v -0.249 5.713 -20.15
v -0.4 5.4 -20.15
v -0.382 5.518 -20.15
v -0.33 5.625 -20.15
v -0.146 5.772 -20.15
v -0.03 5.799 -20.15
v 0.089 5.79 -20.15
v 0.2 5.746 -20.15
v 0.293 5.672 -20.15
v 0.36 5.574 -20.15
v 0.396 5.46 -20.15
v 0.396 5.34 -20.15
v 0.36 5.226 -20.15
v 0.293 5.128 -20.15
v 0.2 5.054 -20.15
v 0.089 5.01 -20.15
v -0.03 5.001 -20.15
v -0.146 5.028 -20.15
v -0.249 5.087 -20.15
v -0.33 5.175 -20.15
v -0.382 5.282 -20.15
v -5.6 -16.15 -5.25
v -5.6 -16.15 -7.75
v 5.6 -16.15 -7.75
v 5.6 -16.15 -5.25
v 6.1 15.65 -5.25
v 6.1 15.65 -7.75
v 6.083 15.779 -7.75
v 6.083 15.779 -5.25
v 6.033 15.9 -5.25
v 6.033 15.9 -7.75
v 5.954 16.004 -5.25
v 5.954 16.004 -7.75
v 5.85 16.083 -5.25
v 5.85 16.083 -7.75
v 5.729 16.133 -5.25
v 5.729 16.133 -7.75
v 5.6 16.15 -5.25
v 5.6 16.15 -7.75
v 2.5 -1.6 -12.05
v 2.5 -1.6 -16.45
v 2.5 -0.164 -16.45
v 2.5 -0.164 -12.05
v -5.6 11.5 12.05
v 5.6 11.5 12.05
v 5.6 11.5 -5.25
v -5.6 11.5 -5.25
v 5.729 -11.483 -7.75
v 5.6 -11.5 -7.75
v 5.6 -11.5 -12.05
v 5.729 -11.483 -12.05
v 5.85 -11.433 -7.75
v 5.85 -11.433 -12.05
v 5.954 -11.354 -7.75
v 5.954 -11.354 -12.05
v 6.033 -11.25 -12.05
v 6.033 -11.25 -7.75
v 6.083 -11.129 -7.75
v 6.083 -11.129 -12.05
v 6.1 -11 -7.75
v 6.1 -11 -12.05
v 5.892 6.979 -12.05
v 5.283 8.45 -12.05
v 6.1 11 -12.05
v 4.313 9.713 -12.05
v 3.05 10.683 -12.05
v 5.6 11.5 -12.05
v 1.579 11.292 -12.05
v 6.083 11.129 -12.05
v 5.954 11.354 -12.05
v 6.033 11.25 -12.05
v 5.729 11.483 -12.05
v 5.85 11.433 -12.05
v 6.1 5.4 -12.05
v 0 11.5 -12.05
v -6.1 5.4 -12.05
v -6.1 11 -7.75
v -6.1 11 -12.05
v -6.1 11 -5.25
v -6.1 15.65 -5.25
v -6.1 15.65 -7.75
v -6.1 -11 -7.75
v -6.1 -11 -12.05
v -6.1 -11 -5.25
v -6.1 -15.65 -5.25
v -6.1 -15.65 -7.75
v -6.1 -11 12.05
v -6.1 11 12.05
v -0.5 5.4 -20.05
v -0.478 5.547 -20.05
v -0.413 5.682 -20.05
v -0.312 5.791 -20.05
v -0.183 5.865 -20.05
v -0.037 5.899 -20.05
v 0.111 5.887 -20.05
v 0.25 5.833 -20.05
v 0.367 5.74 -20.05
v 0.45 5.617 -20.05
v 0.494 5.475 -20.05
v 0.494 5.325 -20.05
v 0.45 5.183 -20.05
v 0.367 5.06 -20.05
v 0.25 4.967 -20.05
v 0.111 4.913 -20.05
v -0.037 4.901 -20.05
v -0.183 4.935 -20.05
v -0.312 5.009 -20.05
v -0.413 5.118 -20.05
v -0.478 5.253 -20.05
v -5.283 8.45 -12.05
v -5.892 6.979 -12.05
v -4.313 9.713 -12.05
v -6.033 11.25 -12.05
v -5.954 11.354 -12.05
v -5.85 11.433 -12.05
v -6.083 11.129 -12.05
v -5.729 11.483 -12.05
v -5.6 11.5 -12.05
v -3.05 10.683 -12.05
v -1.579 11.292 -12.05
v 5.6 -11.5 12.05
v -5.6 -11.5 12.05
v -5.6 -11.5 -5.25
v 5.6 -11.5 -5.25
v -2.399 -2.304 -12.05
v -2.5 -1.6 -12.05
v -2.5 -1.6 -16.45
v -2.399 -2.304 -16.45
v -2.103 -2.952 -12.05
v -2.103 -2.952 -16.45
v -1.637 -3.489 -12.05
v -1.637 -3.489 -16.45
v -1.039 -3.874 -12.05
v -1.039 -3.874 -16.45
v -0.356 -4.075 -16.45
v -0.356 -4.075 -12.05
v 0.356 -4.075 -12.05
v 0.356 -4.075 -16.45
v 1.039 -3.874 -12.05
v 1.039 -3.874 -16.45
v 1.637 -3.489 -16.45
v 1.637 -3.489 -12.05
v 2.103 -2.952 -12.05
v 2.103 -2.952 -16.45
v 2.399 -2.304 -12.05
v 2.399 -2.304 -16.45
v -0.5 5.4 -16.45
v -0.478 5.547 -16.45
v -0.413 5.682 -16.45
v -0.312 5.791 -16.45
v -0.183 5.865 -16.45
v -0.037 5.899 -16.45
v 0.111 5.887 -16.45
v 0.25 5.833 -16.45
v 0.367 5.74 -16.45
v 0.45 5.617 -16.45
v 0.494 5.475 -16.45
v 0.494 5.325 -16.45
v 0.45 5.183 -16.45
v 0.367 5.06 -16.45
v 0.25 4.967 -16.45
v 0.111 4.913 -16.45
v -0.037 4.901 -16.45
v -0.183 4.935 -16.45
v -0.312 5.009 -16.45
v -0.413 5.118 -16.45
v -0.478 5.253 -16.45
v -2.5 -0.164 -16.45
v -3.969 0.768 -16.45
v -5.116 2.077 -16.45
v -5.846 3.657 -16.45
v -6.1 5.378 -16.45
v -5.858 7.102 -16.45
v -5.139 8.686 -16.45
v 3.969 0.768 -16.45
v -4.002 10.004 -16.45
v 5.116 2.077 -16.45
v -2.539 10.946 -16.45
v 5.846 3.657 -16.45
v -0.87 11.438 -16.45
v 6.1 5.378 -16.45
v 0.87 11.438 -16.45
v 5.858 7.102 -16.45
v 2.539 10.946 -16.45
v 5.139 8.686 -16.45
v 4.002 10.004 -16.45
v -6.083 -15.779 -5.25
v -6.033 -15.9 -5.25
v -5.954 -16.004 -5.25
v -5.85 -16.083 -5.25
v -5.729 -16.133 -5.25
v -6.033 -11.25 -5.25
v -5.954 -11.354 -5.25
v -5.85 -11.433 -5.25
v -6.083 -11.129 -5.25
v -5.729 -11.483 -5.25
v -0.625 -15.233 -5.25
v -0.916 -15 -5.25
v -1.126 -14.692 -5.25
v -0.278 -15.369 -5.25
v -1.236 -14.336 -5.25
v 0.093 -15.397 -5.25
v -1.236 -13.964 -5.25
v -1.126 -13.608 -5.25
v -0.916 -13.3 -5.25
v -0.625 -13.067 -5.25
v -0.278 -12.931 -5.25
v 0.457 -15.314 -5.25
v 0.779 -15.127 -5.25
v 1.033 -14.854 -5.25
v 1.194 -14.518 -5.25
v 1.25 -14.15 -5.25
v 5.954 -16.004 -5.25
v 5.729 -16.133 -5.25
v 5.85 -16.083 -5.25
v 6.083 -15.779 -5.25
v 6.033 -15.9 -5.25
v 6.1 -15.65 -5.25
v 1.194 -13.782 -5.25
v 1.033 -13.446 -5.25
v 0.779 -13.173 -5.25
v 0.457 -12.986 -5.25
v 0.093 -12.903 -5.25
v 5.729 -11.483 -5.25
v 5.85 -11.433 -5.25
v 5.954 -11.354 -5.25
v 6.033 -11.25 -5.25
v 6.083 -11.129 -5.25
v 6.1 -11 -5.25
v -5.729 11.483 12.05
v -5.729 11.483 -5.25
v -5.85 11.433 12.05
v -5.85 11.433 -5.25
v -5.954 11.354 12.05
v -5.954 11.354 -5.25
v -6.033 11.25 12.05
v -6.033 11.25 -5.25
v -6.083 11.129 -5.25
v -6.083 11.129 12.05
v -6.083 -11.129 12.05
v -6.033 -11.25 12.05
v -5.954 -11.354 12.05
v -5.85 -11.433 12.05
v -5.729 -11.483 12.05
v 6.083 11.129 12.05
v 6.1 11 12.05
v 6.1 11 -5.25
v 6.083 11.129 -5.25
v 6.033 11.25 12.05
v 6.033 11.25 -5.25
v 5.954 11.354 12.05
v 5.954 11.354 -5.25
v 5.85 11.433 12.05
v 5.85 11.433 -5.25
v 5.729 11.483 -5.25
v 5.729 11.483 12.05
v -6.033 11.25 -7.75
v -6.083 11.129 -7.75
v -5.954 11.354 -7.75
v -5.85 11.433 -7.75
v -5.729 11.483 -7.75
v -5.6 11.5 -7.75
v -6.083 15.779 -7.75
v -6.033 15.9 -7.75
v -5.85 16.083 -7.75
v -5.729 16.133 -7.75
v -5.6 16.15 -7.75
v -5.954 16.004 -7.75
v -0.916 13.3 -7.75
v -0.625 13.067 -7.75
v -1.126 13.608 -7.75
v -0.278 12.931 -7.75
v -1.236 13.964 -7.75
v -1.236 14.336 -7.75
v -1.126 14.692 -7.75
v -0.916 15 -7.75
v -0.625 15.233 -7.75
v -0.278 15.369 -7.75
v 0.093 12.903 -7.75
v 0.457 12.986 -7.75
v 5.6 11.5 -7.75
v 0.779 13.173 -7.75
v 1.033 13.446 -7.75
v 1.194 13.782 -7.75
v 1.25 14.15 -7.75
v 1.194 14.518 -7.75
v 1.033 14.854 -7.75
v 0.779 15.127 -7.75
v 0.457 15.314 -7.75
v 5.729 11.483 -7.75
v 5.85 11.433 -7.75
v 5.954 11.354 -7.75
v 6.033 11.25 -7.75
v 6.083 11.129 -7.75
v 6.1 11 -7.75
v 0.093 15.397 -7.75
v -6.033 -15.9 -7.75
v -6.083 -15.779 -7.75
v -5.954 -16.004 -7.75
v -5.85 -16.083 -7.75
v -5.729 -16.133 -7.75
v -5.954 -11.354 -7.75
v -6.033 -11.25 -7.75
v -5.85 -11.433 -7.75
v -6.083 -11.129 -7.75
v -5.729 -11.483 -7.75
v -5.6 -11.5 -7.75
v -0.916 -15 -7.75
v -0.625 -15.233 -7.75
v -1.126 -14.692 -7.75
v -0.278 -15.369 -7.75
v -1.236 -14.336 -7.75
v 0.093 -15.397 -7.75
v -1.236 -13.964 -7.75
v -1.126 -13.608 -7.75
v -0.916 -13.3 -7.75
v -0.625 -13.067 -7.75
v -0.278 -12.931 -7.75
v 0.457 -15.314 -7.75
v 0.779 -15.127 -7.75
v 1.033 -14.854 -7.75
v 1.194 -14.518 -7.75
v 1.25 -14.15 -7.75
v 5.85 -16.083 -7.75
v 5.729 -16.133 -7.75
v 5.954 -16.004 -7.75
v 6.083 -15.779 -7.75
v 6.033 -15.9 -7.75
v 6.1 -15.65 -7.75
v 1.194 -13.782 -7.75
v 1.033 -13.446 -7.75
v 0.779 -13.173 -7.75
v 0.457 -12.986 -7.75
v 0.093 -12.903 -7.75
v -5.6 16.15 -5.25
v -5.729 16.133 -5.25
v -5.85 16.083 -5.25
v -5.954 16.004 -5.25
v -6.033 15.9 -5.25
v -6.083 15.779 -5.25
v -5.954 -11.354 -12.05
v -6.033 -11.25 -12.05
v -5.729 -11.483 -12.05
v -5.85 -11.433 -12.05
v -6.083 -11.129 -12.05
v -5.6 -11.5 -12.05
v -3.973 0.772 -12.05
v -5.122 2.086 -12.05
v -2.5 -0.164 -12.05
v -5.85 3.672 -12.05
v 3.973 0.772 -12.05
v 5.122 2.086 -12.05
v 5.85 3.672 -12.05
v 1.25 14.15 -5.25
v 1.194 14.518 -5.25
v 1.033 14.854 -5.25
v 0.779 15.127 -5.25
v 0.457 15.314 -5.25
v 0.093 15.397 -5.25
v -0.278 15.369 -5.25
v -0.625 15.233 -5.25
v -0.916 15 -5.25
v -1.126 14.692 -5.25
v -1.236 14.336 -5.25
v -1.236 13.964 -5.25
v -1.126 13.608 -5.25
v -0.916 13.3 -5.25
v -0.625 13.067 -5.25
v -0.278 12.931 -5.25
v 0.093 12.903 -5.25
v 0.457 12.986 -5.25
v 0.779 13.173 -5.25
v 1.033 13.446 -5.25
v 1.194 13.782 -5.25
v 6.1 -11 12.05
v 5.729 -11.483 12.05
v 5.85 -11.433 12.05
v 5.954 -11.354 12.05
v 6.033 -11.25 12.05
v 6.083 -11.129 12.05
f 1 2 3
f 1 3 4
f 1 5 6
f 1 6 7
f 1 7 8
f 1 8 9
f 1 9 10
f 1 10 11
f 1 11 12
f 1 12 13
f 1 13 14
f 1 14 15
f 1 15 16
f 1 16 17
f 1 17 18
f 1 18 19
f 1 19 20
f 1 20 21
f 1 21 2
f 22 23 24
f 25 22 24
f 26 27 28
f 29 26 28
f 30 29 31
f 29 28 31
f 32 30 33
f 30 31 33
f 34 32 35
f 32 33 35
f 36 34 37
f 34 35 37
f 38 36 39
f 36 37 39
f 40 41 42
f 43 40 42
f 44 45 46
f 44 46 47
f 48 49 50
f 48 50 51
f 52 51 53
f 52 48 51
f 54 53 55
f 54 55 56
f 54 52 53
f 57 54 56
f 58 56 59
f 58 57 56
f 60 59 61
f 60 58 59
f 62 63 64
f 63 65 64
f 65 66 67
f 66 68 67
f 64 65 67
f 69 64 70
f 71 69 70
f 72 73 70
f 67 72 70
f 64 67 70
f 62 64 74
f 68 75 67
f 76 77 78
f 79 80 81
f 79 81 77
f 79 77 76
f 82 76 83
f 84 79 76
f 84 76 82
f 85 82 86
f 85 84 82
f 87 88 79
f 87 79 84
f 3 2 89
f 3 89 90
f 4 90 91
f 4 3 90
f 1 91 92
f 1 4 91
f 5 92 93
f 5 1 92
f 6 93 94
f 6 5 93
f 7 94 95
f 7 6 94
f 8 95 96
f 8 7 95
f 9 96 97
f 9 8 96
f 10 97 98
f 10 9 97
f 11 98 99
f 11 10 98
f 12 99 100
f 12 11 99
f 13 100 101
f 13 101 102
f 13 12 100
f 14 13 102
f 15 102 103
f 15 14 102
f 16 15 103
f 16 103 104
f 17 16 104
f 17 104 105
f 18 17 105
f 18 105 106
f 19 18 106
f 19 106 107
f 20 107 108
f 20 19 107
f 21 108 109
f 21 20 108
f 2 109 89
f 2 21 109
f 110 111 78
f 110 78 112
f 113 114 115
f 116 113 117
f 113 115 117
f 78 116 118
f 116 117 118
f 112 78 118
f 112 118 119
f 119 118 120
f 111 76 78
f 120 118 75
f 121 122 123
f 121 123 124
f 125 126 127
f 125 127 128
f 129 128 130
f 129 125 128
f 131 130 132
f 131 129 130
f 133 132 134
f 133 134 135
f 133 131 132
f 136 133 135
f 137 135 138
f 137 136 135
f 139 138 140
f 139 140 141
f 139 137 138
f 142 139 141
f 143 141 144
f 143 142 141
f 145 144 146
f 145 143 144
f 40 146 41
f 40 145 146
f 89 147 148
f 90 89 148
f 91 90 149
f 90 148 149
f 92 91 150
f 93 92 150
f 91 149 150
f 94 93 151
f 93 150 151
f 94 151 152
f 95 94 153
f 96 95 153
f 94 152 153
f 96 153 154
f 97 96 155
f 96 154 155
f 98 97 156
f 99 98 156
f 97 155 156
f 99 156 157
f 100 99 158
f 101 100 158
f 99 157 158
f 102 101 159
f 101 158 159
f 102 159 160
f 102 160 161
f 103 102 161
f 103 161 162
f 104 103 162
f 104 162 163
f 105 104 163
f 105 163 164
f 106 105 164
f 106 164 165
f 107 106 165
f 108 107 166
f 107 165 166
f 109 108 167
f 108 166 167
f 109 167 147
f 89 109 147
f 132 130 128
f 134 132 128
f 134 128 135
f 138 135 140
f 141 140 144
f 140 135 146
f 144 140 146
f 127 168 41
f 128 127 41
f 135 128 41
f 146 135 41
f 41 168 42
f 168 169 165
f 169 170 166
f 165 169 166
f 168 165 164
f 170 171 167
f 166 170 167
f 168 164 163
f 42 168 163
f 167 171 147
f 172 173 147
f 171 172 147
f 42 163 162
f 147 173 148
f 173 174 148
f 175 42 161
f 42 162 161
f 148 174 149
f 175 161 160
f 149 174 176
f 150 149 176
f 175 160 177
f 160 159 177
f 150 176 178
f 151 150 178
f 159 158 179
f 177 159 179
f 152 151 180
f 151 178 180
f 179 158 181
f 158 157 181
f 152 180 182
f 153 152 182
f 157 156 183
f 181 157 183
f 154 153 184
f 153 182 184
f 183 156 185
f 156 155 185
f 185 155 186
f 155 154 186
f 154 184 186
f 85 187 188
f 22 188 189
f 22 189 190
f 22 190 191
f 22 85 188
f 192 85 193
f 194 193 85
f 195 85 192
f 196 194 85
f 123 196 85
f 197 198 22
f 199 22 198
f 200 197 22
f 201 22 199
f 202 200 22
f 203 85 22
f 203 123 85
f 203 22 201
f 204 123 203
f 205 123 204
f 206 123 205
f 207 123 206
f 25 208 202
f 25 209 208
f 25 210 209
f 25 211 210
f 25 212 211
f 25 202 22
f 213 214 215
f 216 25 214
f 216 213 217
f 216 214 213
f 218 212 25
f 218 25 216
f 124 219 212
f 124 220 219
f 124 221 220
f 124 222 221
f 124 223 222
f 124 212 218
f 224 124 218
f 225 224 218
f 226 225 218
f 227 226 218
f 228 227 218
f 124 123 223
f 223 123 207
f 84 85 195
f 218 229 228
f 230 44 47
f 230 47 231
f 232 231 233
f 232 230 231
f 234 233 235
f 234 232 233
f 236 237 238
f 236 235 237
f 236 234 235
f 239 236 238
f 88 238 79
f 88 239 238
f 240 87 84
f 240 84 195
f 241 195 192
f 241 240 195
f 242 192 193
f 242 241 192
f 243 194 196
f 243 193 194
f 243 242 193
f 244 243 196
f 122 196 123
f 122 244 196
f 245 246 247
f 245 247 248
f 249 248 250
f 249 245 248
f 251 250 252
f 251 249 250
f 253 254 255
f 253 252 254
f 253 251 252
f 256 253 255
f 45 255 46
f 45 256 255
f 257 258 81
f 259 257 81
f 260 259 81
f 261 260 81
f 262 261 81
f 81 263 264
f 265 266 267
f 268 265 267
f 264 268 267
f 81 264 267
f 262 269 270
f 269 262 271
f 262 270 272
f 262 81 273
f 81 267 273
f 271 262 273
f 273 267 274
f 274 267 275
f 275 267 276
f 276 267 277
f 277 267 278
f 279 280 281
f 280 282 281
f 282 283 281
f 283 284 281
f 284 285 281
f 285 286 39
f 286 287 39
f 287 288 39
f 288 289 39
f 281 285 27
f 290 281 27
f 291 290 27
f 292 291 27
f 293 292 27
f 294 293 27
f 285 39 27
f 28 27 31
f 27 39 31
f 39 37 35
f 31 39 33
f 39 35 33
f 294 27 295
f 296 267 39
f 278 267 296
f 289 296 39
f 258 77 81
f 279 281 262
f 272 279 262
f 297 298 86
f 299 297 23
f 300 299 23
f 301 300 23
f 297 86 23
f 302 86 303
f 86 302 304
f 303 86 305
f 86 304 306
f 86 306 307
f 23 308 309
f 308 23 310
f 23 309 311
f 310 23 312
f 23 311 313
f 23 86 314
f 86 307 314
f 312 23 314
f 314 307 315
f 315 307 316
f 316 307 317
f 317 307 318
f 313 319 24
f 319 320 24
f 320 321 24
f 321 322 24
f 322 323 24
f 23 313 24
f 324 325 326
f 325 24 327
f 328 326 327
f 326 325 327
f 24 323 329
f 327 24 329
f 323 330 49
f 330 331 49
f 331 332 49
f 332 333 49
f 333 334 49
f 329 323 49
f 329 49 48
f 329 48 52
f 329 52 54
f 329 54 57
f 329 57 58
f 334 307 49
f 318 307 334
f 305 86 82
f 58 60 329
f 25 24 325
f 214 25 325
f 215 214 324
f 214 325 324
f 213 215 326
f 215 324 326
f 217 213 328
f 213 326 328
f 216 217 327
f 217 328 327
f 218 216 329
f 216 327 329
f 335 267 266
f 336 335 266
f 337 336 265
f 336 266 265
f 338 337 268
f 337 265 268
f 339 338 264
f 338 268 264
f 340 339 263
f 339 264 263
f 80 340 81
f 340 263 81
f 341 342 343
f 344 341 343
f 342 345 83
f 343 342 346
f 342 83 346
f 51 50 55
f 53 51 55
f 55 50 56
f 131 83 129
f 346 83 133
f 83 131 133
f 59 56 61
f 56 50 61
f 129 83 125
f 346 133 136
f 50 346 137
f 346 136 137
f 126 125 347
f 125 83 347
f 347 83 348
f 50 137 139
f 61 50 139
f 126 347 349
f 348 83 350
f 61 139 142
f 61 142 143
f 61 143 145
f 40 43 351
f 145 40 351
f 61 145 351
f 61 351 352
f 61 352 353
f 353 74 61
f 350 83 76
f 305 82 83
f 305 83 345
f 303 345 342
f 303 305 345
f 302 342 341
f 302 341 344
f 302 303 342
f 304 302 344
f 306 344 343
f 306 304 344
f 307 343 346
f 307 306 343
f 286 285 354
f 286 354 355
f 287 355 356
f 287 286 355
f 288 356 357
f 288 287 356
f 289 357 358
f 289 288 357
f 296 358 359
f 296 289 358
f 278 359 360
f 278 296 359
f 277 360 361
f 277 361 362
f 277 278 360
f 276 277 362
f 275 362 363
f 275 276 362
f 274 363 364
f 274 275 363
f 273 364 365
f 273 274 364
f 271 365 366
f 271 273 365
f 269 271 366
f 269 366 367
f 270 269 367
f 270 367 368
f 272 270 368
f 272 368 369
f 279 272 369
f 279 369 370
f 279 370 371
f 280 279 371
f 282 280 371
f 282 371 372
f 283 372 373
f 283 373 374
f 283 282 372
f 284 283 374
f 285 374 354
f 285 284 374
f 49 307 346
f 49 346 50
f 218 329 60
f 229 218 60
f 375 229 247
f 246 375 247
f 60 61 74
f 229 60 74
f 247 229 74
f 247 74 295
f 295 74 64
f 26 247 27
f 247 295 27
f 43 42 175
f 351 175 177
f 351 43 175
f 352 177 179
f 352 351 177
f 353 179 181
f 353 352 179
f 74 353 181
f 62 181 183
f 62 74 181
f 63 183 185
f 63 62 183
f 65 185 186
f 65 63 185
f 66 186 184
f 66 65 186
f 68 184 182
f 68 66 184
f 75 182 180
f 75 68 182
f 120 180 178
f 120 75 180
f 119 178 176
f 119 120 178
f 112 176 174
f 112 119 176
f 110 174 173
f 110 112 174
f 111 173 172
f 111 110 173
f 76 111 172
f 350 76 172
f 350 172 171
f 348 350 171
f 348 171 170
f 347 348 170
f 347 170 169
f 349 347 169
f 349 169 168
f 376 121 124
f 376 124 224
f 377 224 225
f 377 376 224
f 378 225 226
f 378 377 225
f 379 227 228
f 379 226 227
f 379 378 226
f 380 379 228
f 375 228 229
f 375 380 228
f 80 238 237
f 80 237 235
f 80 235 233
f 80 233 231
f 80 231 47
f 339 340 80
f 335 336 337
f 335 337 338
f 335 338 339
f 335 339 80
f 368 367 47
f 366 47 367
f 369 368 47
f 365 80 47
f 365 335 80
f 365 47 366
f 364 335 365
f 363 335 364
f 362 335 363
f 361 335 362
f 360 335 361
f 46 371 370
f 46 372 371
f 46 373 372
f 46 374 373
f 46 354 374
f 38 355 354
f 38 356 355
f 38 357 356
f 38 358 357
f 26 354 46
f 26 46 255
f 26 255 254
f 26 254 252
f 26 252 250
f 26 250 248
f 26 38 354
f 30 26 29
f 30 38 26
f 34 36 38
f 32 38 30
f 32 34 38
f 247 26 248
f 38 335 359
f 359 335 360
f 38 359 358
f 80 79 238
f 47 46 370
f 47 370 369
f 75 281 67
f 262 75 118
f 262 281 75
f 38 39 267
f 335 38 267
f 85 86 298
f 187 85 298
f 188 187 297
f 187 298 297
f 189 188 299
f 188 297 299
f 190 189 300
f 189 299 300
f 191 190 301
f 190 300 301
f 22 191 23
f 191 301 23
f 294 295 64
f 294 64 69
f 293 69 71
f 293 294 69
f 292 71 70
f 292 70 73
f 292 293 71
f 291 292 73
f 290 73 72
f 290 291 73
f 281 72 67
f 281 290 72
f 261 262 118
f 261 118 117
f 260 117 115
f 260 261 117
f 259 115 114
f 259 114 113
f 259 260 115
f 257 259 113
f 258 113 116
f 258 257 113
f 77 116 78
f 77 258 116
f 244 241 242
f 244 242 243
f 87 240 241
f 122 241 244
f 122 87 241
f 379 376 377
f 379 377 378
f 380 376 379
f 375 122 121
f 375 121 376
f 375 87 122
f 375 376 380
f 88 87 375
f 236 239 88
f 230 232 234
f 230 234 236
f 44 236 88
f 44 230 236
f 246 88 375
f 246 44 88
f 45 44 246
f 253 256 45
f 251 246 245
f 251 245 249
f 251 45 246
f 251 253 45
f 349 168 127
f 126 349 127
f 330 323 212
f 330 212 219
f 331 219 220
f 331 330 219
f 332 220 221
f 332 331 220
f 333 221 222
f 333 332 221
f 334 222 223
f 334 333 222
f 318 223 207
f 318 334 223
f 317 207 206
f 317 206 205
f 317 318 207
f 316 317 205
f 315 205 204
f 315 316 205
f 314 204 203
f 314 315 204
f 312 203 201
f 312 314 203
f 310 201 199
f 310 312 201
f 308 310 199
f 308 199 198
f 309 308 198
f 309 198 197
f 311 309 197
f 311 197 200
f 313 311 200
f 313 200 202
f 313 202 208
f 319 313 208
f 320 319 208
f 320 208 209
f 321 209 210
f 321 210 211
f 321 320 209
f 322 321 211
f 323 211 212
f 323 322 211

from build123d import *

# Parameters (mm, degrees)
BOSS_EXTRUDE1_DEPTH = 12.05
SKETCH2_R           = 1.25
BOSS_EXTRUDE2_DEPTH = 2.5
BOSS_EXTRUDE3_DEPTH = 4.4
SKETCH4_R           = 0.5
BOSS_EXTRUDE4_DEPTH = 3.7
CHAMFER1_SIZE       = 0.1


with BuildPart() as part:
    # Sketch1 → Boss-Extrude1 (new body, symmetric)
    with BuildSketch(Plane.XY):
        with BuildLine():
            Line((-5.6, -11.5), (5.6, -11.5))
            ThreePointArc((5.6, -11.5), (5.953553391, -11.353553391), (6.1, -11))
            Line((6.1, -11), (6.1, 11))
            ThreePointArc((6.1, 11), (5.953553391, 11.353553391), (5.6, 11.5))
            Line((5.6, 11.5), (-5.6, 11.5))
            ThreePointArc((-5.6, 11.5), (-5.953553391, 11.353553391), (-6.1, 11))
            Line((-6.1, 11), (-6.1, -11))
            ThreePointArc((-6.1, -11), (-5.953553391, -11.353553391), (-5.6, -11.5))
        make_face()
    extrude(amount=BOSS_EXTRUDE1_DEPTH, both=True)

    # Sketch2 → Boss-Extrude2 (add)
    with BuildSketch(Plane.XY.offset(-7.75)):
        with BuildLine():
            Line((6.1, 11), (6.1, 15.65))
            ThreePointArc((6.1, 15.65), (5.953553391, 16.003553391), (5.6, 16.15))
            Line((5.6, 16.15), (-5.6, 16.15))
            ThreePointArc((-5.6, 16.15), (-5.953553391, 16.003553391), (-6.1, 15.65))
            Line((-6.1, 15.65), (-6.1, 11))
            ThreePointArc((-6.1, 11), (-5.953553391, 11.353553391), (-5.6, 11.5))
            Line((-5.6, 11.5), (5.6, 11.5))
            ThreePointArc((5.6, 11.5), (5.953553391, 11.353553391), (6.1, 11))
        make_face()
        with Locations((0, 14.15)):
            Circle(SKETCH2_R, mode=Mode.SUBTRACT)
        with BuildLine():
            Line((5.6, -11.5), (-5.6, -11.5))
            ThreePointArc((-5.6, -11.5), (-5.953553391, -11.353553391), (-6.1, -11))
            Line((-6.1, -11), (-6.1, -15.65))
            ThreePointArc((-6.1, -15.65), (-5.953553391, -16.003553391), (-5.6, -16.15))
            Line((-5.6, -16.15), (5.6, -16.15))
            ThreePointArc((5.6, -16.15), (5.953553391, -16.003553391), (6.1, -15.65))
            Line((6.1, -15.65), (6.1, -11))
            ThreePointArc((6.1, -11), (5.953553391, -11.353553391), (5.6, -11.5))
        make_face()
        with Locations((0, -14.15)):
            Circle(SKETCH2_R, mode=Mode.SUBTRACT)
    extrude(amount=BOSS_EXTRUDE2_DEPTH)

    # Sketch3 → Boss-Extrude3 (add)
    with BuildSketch(Plane(origin=(0, 0, -12.05), x_dir=(-1, 0, 0), z_dir=(0, 0, -1))):
        with BuildLine():
            Line((-2.5, -1.6), (-2.5, -0.164171097))
            ThreePointArc((-2.5, -0.164171097), (0, 11.5), (2.5, -0.164171097))
            Line((2.5, -0.164171097), (2.5, -1.6))
            ThreePointArc((2.5, -1.6), (0, -4.1), (-2.5, -1.6))
        make_face()
    extrude(amount=BOSS_EXTRUDE3_DEPTH)

    # Sketch4 → Boss-Extrude4 (add)
    with BuildSketch(Plane(origin=(0, 0, -16.45), x_dir=(-1, 0, 0), z_dir=(0, 0, -1))):
        with Locations((0, 5.4)):
            Circle(SKETCH4_R)
    extrude(amount=BOSS_EXTRUDE4_DEPTH)

    # Chamfer1
    chamfer1_edges = [part.edges().sort_by_distance(p)[0] for p in [
        (0.5, 5.4, -20.15),
    ]]
    chamfer(chamfer1_edges, length=CHAMFER1_SIZE)


solid = part.part
